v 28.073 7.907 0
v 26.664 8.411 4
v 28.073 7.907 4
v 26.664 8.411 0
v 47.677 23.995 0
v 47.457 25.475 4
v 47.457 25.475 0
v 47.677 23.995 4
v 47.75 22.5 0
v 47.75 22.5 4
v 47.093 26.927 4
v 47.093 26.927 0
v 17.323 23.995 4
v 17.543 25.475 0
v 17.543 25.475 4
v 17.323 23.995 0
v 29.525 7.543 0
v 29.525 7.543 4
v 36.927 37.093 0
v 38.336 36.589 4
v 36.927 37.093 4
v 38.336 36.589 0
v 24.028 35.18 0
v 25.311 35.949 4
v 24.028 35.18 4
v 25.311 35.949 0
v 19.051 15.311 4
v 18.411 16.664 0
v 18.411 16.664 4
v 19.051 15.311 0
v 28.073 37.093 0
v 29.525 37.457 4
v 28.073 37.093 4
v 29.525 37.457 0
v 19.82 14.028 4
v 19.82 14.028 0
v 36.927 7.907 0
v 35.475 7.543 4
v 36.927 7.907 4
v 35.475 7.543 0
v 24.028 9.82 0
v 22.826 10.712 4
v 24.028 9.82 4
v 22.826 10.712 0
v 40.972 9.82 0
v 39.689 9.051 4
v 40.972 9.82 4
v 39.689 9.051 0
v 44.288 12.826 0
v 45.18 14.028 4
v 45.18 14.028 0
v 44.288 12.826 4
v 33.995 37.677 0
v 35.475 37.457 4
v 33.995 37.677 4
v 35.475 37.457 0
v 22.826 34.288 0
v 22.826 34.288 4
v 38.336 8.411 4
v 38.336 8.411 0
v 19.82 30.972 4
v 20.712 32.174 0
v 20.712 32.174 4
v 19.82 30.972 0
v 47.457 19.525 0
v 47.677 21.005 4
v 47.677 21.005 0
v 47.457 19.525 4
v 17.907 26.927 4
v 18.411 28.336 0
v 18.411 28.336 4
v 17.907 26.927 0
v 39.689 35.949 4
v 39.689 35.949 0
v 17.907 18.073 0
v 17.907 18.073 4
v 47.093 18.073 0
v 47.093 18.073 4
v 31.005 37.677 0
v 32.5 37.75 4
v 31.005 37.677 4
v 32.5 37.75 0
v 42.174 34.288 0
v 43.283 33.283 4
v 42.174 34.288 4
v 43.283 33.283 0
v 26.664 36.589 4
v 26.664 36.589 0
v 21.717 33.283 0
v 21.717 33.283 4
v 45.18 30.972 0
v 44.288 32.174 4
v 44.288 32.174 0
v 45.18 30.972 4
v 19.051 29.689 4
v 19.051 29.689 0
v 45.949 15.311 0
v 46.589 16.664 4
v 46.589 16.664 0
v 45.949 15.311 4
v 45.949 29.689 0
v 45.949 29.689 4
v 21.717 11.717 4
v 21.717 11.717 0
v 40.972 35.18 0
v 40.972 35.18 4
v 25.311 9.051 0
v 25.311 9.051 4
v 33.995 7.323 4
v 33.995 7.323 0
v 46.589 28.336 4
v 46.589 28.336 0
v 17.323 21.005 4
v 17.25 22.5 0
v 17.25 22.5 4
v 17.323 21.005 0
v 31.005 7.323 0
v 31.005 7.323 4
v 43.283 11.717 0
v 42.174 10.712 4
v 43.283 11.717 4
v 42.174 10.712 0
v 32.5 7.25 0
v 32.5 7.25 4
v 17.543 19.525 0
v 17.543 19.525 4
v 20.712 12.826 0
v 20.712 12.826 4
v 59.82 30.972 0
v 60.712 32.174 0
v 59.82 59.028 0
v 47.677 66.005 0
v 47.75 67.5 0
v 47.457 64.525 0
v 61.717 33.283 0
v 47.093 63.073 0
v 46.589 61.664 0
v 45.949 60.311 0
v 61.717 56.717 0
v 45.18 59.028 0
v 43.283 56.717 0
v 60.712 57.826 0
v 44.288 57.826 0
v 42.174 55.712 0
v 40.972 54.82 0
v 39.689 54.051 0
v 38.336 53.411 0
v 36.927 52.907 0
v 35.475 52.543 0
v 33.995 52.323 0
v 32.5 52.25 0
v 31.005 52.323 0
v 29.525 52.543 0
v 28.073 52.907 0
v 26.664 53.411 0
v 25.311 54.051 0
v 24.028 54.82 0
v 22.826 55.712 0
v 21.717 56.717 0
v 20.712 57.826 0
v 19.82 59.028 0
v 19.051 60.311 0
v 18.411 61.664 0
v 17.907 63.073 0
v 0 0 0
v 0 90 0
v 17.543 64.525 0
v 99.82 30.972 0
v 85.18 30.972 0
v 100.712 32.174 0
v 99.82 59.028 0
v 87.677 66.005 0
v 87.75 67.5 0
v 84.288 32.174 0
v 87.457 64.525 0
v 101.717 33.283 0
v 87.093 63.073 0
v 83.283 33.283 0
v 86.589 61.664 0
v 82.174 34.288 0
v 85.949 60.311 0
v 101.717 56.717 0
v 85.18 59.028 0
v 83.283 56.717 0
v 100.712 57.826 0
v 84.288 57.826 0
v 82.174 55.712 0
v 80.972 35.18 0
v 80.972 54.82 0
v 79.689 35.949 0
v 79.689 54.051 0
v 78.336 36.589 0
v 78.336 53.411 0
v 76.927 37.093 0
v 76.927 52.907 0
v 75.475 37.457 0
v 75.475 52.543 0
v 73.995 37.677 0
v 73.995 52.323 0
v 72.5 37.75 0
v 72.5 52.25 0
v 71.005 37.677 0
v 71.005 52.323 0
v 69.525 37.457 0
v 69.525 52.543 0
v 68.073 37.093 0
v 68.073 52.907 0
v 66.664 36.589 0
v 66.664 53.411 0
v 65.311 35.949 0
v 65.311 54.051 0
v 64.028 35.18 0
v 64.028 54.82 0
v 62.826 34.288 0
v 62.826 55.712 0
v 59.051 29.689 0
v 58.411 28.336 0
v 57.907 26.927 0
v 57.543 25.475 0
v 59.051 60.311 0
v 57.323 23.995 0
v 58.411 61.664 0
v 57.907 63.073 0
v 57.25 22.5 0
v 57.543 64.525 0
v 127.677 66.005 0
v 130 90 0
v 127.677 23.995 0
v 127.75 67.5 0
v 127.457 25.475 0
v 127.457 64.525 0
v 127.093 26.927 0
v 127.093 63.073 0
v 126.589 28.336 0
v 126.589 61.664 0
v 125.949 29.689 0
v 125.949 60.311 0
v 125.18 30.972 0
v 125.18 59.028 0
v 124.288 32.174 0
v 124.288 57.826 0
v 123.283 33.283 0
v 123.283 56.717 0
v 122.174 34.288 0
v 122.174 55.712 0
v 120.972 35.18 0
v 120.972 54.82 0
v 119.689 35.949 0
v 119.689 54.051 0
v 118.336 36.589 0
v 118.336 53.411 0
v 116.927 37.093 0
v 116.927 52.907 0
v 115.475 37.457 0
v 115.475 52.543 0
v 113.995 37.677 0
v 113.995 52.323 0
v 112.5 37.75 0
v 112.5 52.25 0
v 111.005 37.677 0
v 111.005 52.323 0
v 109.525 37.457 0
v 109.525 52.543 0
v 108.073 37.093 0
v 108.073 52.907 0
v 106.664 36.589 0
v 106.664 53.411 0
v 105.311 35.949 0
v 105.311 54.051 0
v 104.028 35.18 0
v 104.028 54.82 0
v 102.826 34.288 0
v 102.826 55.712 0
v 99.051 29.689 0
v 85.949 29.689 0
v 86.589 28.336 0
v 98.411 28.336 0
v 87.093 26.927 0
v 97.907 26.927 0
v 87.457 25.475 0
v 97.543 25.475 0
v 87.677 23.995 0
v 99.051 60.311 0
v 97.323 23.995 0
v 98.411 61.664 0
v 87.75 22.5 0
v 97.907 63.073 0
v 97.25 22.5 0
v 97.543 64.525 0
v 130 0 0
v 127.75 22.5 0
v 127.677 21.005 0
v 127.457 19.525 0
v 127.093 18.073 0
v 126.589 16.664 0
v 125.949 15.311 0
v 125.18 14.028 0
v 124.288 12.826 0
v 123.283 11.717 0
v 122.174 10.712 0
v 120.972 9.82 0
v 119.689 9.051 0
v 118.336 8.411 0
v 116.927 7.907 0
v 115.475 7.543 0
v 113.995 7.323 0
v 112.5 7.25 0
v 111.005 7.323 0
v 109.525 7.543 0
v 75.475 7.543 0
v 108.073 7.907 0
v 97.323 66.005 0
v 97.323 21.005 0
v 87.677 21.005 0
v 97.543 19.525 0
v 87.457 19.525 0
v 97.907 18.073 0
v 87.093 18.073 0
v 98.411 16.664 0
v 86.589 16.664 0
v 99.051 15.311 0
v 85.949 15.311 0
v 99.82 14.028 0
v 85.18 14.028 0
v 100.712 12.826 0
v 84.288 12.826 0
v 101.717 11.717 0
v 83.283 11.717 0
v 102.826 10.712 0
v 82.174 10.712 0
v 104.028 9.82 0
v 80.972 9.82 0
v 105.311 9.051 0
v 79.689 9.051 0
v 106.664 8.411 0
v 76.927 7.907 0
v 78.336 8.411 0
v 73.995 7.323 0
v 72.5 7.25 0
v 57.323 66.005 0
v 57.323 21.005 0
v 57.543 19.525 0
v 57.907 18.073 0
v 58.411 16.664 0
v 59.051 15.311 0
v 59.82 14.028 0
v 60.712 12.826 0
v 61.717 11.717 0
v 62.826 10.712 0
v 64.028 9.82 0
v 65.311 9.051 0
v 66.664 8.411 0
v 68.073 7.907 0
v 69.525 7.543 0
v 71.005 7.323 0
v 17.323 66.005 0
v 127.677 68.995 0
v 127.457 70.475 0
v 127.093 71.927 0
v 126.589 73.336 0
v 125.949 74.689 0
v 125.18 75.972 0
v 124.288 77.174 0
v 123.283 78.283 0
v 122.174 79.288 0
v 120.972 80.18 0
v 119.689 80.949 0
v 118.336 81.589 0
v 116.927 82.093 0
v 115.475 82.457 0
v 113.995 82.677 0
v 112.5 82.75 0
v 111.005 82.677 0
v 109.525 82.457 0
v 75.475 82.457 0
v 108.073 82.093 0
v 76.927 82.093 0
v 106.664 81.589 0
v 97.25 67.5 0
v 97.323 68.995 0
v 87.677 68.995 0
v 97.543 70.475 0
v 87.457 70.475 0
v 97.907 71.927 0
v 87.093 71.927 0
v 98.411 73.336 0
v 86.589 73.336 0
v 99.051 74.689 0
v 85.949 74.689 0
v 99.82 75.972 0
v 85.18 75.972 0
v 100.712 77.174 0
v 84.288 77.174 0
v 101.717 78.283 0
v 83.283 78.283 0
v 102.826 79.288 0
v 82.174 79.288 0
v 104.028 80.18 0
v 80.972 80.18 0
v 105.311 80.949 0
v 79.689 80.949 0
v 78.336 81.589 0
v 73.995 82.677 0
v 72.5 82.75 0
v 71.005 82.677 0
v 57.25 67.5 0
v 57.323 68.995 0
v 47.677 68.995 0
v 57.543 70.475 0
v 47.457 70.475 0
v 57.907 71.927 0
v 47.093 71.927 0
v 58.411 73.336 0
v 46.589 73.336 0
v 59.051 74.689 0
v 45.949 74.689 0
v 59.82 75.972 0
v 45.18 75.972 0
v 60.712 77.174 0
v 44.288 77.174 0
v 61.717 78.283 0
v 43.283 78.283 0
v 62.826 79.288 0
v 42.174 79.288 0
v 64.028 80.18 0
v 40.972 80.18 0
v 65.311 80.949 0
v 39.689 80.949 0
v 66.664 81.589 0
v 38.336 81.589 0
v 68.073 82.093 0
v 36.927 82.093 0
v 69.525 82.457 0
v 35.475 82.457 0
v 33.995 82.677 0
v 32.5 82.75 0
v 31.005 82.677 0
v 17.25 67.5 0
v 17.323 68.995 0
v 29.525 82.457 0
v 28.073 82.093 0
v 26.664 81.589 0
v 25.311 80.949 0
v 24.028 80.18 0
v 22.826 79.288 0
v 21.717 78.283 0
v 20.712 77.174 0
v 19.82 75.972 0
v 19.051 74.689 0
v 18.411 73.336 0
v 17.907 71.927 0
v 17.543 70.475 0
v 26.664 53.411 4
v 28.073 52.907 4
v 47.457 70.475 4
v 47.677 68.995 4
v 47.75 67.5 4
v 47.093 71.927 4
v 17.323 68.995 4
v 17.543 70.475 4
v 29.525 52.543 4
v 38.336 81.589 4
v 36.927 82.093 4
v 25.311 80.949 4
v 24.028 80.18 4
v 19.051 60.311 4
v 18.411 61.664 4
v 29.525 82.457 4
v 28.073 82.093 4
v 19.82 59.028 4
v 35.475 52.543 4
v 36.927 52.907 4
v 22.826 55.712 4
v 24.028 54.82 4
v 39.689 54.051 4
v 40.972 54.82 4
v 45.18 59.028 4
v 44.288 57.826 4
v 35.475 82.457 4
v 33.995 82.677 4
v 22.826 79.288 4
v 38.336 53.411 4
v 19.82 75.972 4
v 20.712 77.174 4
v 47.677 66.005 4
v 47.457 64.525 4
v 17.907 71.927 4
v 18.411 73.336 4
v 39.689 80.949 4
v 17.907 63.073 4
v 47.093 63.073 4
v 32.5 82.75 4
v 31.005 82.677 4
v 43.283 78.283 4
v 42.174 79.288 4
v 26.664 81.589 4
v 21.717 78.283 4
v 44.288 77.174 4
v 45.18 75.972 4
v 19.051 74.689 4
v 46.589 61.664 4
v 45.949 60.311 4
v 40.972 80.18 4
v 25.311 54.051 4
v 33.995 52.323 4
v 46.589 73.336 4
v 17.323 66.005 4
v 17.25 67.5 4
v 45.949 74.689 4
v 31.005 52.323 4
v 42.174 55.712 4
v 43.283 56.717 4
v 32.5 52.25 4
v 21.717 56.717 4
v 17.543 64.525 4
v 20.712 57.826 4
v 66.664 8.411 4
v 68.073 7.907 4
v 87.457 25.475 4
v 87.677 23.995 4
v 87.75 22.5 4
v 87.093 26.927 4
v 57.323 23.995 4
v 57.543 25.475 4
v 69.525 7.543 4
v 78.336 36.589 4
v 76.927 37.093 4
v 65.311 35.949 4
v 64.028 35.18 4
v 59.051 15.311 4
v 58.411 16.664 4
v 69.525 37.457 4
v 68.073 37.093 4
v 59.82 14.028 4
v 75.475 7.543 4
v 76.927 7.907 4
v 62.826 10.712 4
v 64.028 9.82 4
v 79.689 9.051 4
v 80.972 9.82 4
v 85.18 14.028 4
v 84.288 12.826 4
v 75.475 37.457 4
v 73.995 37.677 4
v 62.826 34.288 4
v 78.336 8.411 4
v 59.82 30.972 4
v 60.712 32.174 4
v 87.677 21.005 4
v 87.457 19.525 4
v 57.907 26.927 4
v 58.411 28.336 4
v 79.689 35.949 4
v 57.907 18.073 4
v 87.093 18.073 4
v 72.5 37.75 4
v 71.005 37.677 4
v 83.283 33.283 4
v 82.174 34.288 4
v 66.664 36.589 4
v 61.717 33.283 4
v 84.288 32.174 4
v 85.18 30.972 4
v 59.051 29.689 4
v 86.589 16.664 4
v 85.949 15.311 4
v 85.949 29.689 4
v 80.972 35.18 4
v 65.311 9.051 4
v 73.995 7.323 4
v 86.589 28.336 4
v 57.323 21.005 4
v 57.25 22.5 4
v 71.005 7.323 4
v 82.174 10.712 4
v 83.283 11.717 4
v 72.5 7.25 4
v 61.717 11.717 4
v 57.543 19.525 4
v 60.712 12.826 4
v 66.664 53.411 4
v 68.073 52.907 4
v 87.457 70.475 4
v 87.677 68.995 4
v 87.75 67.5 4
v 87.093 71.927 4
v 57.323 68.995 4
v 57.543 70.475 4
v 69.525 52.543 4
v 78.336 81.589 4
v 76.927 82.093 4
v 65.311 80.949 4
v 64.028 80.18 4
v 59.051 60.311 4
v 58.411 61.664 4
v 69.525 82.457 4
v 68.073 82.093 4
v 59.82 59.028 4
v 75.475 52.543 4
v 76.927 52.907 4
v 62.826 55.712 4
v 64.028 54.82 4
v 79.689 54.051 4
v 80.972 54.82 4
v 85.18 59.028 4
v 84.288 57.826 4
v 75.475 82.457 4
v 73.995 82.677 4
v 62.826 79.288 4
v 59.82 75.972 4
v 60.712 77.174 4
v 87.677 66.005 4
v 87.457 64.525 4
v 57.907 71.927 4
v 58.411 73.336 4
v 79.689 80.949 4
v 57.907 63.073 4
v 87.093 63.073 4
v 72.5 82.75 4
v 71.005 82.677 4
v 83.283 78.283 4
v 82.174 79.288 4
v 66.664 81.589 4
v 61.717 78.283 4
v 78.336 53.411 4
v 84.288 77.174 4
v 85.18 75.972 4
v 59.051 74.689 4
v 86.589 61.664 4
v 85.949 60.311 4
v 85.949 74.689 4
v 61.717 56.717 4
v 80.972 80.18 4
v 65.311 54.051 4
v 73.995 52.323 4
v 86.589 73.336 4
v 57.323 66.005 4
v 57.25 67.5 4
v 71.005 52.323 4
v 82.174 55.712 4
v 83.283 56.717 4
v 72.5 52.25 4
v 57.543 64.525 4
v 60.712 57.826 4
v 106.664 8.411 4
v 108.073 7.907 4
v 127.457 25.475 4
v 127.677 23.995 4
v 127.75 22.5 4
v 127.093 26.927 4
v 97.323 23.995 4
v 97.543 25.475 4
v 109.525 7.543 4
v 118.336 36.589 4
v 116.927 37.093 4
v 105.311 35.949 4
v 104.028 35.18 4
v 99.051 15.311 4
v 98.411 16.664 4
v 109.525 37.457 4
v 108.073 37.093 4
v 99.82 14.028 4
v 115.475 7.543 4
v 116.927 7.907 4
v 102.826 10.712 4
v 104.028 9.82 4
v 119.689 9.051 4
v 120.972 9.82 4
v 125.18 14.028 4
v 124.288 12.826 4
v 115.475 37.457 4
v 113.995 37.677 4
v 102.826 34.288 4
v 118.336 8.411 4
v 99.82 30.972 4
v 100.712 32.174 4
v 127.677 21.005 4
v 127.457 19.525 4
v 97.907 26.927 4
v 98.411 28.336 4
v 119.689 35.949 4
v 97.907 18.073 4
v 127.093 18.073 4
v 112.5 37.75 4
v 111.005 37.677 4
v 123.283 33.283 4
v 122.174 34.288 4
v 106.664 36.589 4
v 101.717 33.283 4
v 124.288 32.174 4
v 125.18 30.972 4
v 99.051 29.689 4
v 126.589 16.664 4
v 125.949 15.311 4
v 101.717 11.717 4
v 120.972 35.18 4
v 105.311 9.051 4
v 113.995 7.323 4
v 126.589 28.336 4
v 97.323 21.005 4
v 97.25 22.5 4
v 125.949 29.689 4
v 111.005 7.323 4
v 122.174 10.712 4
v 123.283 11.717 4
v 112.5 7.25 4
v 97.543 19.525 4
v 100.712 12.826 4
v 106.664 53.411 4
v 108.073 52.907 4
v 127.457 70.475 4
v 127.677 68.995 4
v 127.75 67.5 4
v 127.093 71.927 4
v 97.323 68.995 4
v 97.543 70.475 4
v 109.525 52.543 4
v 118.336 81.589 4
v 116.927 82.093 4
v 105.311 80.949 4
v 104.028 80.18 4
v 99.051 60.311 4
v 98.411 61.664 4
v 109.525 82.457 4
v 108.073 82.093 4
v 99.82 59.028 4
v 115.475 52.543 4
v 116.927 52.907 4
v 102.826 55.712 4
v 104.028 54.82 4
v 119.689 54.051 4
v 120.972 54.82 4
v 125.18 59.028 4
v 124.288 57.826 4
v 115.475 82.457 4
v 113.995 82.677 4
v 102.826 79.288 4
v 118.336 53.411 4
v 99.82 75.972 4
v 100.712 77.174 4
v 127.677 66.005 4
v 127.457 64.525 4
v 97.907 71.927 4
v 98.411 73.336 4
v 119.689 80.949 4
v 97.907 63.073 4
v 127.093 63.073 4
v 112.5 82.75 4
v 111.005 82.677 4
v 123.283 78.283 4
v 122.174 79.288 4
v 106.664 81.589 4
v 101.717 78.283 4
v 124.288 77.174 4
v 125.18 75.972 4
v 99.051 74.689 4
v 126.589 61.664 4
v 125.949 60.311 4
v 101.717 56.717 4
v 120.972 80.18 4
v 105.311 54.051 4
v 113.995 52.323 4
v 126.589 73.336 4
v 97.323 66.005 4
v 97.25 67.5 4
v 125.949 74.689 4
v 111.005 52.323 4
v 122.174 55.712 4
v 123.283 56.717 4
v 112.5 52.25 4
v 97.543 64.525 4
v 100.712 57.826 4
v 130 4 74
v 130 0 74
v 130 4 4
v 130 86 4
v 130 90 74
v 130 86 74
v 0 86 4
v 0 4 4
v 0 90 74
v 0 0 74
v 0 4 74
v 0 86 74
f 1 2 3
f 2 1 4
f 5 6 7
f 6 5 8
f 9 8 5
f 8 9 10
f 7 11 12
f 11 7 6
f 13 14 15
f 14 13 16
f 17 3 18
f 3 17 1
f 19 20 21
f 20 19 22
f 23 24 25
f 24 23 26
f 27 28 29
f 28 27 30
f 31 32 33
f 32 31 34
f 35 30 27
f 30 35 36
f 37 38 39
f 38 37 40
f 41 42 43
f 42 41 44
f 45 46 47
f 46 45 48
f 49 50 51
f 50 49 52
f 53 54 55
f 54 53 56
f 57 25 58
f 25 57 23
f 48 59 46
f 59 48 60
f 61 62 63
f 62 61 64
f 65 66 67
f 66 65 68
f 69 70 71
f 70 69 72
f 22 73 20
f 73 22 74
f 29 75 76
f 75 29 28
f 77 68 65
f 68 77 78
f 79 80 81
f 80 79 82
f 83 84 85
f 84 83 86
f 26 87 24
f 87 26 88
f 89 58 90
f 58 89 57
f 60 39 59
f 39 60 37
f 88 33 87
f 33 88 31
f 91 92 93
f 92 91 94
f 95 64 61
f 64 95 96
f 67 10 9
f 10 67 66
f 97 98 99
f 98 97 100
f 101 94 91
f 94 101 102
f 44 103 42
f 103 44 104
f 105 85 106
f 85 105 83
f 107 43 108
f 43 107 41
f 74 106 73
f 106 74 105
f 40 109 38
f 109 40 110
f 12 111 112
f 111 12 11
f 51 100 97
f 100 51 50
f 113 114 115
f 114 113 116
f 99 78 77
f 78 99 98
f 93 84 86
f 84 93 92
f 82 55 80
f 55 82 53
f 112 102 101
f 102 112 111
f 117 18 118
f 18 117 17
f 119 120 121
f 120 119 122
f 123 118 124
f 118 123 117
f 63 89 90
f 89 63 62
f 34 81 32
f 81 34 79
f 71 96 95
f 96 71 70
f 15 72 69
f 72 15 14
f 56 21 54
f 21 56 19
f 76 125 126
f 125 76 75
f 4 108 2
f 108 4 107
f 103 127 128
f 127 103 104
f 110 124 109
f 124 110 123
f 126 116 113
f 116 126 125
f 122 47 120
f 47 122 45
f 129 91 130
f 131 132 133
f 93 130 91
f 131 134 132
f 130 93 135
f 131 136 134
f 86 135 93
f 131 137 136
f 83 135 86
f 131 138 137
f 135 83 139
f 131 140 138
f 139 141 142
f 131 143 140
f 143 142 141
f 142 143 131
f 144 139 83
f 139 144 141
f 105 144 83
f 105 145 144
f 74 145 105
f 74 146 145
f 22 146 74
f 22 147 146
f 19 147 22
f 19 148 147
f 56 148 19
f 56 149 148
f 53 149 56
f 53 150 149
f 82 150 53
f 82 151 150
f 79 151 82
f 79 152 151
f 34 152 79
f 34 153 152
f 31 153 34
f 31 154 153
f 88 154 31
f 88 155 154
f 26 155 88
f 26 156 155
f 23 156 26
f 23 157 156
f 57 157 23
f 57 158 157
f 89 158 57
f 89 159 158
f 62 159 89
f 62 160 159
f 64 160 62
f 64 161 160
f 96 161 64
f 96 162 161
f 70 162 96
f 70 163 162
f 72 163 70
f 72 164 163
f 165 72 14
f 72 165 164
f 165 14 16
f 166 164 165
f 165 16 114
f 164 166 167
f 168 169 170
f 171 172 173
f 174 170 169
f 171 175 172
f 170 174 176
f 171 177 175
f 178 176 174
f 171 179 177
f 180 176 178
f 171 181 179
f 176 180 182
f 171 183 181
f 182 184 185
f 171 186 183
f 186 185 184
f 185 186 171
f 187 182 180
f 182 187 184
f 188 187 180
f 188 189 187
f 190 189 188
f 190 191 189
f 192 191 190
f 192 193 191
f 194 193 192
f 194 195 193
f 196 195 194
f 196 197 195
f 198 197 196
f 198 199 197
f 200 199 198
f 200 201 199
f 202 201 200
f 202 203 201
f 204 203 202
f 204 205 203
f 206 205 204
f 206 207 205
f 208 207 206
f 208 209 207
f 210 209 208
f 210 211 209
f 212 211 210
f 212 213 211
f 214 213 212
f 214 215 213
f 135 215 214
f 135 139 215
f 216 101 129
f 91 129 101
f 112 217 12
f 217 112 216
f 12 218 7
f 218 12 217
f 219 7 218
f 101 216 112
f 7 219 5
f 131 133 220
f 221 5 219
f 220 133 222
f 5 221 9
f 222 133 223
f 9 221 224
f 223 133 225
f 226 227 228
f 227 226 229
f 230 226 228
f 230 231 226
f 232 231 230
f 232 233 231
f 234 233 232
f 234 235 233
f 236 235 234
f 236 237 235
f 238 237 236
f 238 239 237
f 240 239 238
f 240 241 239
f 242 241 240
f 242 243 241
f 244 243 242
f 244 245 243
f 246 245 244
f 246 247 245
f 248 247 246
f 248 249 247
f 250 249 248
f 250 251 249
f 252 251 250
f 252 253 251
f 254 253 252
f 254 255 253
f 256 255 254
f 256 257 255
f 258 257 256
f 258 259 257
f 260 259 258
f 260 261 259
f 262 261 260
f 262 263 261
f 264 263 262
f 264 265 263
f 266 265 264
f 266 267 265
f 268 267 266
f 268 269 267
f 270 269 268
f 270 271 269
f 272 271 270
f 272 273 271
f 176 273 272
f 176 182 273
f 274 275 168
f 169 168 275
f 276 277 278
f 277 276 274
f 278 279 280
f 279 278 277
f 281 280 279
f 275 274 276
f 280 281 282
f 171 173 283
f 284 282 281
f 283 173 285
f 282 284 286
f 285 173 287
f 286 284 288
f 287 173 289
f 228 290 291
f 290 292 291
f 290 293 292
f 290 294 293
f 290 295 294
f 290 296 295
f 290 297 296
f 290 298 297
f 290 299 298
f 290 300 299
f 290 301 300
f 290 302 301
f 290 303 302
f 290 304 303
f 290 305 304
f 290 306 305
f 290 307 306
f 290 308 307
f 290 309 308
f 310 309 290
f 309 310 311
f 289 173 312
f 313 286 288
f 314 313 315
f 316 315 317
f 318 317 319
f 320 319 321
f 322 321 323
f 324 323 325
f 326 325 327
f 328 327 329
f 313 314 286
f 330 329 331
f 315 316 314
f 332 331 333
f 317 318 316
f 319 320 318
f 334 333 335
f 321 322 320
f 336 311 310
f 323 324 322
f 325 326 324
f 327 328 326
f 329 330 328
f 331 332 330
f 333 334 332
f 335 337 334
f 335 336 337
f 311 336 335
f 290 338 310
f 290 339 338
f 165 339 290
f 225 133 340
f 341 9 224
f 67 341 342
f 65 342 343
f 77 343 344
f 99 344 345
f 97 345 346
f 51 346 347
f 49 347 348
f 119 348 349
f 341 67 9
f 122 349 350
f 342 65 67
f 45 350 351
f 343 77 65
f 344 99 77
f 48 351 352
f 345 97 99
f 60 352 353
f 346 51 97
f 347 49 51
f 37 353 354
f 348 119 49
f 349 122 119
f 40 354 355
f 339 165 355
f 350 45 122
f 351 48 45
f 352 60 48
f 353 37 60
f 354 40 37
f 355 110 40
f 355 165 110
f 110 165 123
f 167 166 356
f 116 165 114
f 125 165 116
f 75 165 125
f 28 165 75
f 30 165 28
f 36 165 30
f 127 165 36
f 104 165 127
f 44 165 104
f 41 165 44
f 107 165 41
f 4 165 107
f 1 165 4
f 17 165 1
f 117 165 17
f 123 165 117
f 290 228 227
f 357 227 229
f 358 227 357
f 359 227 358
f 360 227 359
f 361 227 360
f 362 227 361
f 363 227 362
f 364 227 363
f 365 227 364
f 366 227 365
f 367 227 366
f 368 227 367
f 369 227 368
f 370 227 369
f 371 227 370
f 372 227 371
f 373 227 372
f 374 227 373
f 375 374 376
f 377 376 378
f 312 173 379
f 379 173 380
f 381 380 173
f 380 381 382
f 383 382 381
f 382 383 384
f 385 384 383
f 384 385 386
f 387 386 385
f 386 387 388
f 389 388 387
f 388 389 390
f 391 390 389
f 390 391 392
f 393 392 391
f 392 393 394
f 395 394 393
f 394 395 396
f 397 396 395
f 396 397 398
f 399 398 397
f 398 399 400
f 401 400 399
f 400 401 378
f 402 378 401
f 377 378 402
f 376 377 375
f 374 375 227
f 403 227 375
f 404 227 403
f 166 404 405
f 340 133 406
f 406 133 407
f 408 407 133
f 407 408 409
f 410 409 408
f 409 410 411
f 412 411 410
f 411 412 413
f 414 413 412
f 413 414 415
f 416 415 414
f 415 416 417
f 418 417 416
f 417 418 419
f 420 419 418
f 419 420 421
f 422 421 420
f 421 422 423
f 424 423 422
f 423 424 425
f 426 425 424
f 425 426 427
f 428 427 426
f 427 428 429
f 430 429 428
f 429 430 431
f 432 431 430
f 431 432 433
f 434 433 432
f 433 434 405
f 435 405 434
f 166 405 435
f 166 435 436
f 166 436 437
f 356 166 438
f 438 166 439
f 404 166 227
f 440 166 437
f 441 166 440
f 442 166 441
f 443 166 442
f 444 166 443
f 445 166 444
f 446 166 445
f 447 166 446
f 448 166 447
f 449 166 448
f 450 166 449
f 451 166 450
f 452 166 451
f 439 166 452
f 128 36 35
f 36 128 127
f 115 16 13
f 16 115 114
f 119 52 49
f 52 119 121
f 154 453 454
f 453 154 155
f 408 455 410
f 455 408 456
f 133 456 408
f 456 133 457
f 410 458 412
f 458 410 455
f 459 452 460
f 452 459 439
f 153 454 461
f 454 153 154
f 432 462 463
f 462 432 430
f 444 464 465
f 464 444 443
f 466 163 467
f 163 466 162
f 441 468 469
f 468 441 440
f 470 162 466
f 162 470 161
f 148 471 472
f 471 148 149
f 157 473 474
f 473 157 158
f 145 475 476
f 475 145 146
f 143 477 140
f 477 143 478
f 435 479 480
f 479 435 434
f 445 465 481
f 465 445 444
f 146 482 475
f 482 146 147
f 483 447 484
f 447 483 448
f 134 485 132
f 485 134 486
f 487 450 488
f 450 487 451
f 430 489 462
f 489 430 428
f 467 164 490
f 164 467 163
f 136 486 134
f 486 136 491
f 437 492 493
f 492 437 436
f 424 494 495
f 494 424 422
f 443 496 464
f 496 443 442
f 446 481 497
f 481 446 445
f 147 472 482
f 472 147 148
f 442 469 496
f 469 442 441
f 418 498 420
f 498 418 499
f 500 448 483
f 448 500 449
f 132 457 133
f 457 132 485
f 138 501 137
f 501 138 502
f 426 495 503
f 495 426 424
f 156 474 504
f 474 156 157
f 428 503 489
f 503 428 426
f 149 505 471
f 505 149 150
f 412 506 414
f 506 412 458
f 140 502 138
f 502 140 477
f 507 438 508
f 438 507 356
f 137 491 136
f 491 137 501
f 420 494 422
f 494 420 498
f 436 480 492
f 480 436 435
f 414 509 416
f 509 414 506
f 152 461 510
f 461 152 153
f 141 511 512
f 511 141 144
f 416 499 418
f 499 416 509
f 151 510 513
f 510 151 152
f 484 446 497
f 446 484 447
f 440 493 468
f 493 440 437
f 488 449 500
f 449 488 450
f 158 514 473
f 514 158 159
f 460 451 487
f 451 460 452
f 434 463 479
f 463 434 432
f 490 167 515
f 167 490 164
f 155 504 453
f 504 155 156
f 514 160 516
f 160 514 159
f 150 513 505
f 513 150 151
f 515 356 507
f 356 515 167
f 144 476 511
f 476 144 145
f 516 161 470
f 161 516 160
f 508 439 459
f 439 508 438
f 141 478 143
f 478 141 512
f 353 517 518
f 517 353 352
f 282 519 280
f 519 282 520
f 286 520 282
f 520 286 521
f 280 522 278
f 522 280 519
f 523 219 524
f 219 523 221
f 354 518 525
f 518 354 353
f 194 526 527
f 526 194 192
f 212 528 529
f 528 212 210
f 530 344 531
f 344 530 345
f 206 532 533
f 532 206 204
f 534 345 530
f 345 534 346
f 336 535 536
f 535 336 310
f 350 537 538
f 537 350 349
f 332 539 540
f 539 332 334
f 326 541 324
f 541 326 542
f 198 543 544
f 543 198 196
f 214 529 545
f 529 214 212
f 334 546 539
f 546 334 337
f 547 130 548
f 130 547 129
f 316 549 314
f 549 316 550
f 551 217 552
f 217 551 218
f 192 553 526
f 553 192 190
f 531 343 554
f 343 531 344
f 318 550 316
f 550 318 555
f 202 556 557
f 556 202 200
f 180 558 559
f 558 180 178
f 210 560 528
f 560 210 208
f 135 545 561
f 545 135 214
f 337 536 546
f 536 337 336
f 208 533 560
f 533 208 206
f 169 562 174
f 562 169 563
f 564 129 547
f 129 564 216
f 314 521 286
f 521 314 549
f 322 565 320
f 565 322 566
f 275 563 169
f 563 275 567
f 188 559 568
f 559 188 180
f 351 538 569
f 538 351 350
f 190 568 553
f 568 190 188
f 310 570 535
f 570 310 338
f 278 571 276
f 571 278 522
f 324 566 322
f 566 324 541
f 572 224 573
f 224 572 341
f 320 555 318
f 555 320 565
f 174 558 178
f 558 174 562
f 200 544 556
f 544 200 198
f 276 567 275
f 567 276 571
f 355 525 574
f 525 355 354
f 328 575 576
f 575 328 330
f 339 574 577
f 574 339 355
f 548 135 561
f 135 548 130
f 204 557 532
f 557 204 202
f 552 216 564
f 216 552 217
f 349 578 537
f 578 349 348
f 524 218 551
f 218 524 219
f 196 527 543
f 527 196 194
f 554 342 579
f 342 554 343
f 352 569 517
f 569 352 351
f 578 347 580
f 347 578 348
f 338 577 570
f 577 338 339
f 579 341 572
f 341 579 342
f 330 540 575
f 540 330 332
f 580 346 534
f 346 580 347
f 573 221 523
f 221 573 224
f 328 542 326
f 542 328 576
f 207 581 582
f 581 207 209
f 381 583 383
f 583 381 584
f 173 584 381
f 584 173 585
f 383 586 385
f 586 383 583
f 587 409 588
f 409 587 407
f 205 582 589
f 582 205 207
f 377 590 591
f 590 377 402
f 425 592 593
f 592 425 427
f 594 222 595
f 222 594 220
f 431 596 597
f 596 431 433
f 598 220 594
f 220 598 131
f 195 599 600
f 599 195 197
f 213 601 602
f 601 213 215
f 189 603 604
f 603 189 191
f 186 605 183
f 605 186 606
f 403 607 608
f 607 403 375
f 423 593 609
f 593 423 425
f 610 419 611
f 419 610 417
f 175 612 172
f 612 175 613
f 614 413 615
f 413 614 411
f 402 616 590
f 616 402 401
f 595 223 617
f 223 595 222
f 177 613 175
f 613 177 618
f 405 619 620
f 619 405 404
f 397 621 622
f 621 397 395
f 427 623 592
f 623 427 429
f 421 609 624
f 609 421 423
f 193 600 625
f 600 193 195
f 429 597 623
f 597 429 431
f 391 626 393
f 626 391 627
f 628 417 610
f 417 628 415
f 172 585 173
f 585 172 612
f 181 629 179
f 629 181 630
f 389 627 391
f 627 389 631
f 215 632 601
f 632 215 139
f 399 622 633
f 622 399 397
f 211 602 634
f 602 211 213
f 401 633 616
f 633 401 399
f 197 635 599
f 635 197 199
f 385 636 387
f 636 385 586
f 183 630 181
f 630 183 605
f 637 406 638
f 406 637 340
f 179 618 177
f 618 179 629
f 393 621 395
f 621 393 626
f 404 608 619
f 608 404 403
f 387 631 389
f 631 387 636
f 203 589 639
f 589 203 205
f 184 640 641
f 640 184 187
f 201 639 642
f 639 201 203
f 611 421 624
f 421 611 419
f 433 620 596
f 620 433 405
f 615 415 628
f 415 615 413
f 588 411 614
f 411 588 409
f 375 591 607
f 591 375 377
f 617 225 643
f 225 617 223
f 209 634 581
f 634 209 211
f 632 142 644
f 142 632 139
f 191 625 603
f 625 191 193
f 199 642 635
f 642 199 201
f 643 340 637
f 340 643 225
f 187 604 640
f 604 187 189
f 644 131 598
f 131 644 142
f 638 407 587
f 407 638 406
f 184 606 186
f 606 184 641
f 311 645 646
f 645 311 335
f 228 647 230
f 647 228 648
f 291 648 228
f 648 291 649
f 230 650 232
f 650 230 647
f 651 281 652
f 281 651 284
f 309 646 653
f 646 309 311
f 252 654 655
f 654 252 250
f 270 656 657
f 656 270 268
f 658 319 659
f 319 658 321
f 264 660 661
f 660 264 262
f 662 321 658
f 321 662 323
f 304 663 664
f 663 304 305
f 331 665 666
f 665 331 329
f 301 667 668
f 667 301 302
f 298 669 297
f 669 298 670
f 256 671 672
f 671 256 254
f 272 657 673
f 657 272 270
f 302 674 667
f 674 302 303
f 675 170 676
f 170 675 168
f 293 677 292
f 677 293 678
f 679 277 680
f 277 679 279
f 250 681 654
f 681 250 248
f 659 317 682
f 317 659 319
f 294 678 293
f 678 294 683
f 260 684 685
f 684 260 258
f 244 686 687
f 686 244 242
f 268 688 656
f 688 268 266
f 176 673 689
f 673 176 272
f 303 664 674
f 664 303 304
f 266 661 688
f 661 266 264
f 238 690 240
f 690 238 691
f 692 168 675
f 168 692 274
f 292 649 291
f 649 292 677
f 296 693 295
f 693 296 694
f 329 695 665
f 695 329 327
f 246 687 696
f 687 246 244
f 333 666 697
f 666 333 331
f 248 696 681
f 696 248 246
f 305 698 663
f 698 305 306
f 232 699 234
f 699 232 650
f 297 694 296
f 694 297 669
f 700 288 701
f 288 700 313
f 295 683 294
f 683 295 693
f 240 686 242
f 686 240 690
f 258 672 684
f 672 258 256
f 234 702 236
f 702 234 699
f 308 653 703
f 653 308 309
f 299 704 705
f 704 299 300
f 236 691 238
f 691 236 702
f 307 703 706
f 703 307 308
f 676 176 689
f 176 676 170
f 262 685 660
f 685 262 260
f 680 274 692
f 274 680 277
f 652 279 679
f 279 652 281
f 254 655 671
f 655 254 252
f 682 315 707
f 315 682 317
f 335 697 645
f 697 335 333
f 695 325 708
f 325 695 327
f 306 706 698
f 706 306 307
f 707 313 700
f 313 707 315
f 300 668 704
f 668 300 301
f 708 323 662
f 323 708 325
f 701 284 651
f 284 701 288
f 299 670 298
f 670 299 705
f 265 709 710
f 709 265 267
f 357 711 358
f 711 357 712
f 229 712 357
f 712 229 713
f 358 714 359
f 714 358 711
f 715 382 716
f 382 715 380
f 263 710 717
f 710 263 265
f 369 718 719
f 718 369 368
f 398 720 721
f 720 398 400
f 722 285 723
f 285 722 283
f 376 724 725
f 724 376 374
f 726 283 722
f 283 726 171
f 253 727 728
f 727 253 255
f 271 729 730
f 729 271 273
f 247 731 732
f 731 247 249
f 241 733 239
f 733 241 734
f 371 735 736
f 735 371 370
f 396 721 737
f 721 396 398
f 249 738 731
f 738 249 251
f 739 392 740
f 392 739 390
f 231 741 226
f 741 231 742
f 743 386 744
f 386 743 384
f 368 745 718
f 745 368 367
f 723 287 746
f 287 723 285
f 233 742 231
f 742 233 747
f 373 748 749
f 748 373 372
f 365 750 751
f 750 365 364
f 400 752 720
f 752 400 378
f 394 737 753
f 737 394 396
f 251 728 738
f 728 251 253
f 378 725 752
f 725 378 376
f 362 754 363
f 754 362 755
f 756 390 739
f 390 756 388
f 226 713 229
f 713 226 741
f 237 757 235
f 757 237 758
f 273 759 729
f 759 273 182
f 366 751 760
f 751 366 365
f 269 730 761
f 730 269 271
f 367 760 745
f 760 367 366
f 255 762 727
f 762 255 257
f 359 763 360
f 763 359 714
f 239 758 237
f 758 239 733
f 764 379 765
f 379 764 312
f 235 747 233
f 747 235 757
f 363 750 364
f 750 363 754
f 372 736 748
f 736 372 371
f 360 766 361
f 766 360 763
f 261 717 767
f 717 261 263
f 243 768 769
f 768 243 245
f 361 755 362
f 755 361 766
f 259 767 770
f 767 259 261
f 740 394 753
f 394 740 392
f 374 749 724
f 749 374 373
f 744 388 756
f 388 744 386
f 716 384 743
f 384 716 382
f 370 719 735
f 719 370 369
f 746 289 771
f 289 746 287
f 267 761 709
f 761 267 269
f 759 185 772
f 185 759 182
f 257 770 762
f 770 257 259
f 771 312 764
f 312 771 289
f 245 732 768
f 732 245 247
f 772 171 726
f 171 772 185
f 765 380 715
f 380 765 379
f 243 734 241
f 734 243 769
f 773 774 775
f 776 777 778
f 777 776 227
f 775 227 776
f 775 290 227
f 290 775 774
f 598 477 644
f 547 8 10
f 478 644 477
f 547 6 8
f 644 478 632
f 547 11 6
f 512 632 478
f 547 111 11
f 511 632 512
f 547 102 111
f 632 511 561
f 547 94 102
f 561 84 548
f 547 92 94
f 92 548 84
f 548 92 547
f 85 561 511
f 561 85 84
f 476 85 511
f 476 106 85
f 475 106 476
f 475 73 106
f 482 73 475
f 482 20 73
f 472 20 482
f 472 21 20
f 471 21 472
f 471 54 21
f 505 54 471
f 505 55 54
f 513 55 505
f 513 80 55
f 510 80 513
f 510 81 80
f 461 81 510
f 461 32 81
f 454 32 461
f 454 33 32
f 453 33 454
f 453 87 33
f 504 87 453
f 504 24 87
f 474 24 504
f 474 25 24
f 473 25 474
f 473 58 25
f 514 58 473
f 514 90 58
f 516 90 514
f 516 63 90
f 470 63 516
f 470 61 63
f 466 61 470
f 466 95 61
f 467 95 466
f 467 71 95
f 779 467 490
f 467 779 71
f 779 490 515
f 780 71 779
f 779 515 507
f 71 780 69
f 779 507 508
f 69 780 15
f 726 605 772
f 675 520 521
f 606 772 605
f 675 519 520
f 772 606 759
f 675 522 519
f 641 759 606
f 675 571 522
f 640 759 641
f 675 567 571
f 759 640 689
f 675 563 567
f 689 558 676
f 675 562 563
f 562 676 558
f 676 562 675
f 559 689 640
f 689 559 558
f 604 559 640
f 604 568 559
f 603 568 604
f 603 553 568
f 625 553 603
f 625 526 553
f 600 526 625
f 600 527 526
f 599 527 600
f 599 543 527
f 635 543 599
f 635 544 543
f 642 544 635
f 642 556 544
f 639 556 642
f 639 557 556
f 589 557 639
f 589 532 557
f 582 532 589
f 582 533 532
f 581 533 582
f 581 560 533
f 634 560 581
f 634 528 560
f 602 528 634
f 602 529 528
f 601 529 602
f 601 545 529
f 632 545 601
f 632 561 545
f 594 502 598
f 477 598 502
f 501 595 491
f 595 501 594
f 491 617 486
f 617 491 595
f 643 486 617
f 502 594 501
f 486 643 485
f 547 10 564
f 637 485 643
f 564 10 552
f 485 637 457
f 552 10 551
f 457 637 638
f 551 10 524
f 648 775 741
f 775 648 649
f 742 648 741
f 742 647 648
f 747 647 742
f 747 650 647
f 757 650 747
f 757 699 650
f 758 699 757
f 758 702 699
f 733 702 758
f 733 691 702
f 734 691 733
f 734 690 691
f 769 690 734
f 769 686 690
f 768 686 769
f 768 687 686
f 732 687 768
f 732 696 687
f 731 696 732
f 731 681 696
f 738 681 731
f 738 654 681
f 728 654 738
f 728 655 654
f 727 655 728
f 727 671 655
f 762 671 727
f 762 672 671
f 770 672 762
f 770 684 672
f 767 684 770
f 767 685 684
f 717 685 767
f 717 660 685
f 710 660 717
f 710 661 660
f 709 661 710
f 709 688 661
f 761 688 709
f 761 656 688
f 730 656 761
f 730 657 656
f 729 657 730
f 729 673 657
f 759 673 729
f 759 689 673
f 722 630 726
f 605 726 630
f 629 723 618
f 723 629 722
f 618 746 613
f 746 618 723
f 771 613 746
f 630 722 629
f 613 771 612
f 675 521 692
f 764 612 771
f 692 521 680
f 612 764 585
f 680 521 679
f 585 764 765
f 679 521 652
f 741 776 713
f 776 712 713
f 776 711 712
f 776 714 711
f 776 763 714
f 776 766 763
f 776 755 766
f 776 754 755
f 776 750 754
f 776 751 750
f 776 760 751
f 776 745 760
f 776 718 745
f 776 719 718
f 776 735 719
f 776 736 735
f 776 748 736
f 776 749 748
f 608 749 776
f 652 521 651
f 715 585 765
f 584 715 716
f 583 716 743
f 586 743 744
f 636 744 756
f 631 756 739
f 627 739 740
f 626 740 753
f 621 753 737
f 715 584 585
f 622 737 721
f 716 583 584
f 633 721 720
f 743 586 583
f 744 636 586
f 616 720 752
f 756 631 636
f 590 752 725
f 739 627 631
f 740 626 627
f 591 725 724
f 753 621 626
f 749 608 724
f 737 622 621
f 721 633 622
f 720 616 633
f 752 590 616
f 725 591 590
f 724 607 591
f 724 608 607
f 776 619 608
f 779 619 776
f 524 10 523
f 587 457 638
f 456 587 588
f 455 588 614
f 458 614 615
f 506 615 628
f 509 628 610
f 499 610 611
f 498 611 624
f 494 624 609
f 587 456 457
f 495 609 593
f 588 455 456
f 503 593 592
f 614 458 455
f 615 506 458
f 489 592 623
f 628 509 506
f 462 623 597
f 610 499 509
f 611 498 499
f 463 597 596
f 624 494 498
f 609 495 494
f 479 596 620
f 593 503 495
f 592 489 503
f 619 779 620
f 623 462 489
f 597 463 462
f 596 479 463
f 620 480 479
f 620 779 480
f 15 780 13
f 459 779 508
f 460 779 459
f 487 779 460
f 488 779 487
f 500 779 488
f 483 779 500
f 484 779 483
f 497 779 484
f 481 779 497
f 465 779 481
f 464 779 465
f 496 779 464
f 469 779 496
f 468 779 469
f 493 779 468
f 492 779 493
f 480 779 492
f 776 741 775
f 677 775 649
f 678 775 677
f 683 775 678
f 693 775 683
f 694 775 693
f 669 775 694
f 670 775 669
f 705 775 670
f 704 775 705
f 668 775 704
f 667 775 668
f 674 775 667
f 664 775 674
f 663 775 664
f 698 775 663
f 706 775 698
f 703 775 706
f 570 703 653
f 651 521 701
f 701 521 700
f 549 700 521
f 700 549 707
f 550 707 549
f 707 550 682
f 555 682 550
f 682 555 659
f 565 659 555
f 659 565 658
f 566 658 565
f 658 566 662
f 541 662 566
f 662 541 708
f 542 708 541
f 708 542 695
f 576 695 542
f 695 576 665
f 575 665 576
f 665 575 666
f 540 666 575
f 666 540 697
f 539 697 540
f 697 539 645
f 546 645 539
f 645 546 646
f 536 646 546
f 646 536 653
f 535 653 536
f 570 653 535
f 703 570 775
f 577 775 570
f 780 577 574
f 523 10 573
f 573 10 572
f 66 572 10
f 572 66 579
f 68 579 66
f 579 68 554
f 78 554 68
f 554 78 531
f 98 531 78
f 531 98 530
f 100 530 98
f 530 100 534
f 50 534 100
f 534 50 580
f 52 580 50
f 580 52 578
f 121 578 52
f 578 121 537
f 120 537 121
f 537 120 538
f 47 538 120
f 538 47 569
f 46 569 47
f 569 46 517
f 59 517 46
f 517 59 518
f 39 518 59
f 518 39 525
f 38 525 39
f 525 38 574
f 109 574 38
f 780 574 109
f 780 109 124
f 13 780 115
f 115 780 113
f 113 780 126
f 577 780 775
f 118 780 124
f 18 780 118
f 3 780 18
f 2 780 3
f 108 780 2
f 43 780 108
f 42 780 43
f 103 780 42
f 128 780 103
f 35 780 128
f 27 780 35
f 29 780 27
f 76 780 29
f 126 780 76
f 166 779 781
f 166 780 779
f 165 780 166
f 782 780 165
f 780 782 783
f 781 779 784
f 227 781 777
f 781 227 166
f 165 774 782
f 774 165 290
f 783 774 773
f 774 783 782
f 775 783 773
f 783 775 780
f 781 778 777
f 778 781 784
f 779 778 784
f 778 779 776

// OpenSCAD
// Dimensions
plate_x = 130;
plate_y = 90;
plate_z = 4;
hole_diameter = 30.5;
hole_radius = hole_diameter / 2;
num_rows = 2; // Along Y
num_cols = 3; // Along X
pitch_x = 40;
pitch_y = 40;
wall_height = 70;
wall_thickness = 4;

// Calculate hole positions
// Centred on the plate in X and Y
// X range: 0 to 130. Centres at 130/4 = 32.5, 72.5, 112.5
// Y range: 0 to 90. Centres at 90/4 = 22.5, 67.5

x_positions = [32.5, 72.5, 112.5];
y_positions = [22.5, 67.5];

// Wall positions
// Long edges are along X. Walls are at Y=0 and Y=plate_y.
// Wall length is 130 (X). Thickness is 4 (Y).
// Since the plate is 0 to 130 in X and 0 to 90 in Y,
// The walls should be flush with the long edges.
// Let's assume the walls are on the outside or inside?
// "flush with the plate's long edge". Usually implies the wall is part of the plate structure.
// If the wall is 4mm thick in Y, and the plate is 90mm wide in Y.
// Let's place the walls at Y=0 and Y=90? No, that would be outside.
// Let's place them at Y=0 to Y=4 and Y=86 to Y=90?
// Or Y=-2 to Y=2?
// "flush with the plate's long edge" usually means the outer face of the wall aligns with the plate edge.
// Let's assume the walls are on the Y=0 and Y=90 sides.
// Wall 1: X: 0-130, Y: 0-4, Z: 4-74
// Wall 2: X: 0-130, Y: 86-90, Z: 4-74
// This leaves the short ends (X=0 and X=130) open.

// However, if the walls are 4mm thick, and we want them flush with the edge:
// If the plate is 0..130 x 0..90.
// Wall at Y=0: Y from 0 to 4.
// Wall at Y=90: Y from 86 to 90.
// This seems correct.

// Holes are through-holes in the plate.
// The plate is z=0 to z=4.
// The holes go through the plate.
// Do the holes go through the walls?
// "Two solid walls... flush with the plate's long edge".
// "Two short ends stay open".
// The holes are in the middle of the plate (Y=22.5 and 67.5).
// The walls are at Y=0..4 and Y=86..90.
// So the holes do not intersect the walls.

// Print orientation:
// Plate rests on XY plane at z=0.
// Plate is z=0 to z=4.
// Walls rise from z=4 to z=70.
// Holes are through the plate (z=0 to z=4).

// To ensure no coplanar faces in difference(), we extend cutters.

module rack() {
    // 1. Base Plate
    difference() {
        // Main plate
        cube([plate_x, plate_y, plate_z], center=false);
        
        // Holes
        // Extend hole cutter from z=-1 to z=5 to ensure clean cut through plate
        for (x = x_positions) {
            for (y = y_positions) {
                translate([x, y, 0]) {
                    $fn = 64;
                    cylinder(h=5, d=hole_diameter, center=false);
                }
            }
        }
    }
    
    // 2. Walls
    // Wall 1 (Y=0 side)
    translate([0, 0, 4]) {
        cube([plate_x, wall_thickness, wall_height], center=false);
    }
    
    // Wall 2 (Y=90 side)
    translate([0, plate_y - wall_thickness, 4]) {
        cube([plate_x, wall_thickness, wall_height], center=false);
    }
}

rack();
